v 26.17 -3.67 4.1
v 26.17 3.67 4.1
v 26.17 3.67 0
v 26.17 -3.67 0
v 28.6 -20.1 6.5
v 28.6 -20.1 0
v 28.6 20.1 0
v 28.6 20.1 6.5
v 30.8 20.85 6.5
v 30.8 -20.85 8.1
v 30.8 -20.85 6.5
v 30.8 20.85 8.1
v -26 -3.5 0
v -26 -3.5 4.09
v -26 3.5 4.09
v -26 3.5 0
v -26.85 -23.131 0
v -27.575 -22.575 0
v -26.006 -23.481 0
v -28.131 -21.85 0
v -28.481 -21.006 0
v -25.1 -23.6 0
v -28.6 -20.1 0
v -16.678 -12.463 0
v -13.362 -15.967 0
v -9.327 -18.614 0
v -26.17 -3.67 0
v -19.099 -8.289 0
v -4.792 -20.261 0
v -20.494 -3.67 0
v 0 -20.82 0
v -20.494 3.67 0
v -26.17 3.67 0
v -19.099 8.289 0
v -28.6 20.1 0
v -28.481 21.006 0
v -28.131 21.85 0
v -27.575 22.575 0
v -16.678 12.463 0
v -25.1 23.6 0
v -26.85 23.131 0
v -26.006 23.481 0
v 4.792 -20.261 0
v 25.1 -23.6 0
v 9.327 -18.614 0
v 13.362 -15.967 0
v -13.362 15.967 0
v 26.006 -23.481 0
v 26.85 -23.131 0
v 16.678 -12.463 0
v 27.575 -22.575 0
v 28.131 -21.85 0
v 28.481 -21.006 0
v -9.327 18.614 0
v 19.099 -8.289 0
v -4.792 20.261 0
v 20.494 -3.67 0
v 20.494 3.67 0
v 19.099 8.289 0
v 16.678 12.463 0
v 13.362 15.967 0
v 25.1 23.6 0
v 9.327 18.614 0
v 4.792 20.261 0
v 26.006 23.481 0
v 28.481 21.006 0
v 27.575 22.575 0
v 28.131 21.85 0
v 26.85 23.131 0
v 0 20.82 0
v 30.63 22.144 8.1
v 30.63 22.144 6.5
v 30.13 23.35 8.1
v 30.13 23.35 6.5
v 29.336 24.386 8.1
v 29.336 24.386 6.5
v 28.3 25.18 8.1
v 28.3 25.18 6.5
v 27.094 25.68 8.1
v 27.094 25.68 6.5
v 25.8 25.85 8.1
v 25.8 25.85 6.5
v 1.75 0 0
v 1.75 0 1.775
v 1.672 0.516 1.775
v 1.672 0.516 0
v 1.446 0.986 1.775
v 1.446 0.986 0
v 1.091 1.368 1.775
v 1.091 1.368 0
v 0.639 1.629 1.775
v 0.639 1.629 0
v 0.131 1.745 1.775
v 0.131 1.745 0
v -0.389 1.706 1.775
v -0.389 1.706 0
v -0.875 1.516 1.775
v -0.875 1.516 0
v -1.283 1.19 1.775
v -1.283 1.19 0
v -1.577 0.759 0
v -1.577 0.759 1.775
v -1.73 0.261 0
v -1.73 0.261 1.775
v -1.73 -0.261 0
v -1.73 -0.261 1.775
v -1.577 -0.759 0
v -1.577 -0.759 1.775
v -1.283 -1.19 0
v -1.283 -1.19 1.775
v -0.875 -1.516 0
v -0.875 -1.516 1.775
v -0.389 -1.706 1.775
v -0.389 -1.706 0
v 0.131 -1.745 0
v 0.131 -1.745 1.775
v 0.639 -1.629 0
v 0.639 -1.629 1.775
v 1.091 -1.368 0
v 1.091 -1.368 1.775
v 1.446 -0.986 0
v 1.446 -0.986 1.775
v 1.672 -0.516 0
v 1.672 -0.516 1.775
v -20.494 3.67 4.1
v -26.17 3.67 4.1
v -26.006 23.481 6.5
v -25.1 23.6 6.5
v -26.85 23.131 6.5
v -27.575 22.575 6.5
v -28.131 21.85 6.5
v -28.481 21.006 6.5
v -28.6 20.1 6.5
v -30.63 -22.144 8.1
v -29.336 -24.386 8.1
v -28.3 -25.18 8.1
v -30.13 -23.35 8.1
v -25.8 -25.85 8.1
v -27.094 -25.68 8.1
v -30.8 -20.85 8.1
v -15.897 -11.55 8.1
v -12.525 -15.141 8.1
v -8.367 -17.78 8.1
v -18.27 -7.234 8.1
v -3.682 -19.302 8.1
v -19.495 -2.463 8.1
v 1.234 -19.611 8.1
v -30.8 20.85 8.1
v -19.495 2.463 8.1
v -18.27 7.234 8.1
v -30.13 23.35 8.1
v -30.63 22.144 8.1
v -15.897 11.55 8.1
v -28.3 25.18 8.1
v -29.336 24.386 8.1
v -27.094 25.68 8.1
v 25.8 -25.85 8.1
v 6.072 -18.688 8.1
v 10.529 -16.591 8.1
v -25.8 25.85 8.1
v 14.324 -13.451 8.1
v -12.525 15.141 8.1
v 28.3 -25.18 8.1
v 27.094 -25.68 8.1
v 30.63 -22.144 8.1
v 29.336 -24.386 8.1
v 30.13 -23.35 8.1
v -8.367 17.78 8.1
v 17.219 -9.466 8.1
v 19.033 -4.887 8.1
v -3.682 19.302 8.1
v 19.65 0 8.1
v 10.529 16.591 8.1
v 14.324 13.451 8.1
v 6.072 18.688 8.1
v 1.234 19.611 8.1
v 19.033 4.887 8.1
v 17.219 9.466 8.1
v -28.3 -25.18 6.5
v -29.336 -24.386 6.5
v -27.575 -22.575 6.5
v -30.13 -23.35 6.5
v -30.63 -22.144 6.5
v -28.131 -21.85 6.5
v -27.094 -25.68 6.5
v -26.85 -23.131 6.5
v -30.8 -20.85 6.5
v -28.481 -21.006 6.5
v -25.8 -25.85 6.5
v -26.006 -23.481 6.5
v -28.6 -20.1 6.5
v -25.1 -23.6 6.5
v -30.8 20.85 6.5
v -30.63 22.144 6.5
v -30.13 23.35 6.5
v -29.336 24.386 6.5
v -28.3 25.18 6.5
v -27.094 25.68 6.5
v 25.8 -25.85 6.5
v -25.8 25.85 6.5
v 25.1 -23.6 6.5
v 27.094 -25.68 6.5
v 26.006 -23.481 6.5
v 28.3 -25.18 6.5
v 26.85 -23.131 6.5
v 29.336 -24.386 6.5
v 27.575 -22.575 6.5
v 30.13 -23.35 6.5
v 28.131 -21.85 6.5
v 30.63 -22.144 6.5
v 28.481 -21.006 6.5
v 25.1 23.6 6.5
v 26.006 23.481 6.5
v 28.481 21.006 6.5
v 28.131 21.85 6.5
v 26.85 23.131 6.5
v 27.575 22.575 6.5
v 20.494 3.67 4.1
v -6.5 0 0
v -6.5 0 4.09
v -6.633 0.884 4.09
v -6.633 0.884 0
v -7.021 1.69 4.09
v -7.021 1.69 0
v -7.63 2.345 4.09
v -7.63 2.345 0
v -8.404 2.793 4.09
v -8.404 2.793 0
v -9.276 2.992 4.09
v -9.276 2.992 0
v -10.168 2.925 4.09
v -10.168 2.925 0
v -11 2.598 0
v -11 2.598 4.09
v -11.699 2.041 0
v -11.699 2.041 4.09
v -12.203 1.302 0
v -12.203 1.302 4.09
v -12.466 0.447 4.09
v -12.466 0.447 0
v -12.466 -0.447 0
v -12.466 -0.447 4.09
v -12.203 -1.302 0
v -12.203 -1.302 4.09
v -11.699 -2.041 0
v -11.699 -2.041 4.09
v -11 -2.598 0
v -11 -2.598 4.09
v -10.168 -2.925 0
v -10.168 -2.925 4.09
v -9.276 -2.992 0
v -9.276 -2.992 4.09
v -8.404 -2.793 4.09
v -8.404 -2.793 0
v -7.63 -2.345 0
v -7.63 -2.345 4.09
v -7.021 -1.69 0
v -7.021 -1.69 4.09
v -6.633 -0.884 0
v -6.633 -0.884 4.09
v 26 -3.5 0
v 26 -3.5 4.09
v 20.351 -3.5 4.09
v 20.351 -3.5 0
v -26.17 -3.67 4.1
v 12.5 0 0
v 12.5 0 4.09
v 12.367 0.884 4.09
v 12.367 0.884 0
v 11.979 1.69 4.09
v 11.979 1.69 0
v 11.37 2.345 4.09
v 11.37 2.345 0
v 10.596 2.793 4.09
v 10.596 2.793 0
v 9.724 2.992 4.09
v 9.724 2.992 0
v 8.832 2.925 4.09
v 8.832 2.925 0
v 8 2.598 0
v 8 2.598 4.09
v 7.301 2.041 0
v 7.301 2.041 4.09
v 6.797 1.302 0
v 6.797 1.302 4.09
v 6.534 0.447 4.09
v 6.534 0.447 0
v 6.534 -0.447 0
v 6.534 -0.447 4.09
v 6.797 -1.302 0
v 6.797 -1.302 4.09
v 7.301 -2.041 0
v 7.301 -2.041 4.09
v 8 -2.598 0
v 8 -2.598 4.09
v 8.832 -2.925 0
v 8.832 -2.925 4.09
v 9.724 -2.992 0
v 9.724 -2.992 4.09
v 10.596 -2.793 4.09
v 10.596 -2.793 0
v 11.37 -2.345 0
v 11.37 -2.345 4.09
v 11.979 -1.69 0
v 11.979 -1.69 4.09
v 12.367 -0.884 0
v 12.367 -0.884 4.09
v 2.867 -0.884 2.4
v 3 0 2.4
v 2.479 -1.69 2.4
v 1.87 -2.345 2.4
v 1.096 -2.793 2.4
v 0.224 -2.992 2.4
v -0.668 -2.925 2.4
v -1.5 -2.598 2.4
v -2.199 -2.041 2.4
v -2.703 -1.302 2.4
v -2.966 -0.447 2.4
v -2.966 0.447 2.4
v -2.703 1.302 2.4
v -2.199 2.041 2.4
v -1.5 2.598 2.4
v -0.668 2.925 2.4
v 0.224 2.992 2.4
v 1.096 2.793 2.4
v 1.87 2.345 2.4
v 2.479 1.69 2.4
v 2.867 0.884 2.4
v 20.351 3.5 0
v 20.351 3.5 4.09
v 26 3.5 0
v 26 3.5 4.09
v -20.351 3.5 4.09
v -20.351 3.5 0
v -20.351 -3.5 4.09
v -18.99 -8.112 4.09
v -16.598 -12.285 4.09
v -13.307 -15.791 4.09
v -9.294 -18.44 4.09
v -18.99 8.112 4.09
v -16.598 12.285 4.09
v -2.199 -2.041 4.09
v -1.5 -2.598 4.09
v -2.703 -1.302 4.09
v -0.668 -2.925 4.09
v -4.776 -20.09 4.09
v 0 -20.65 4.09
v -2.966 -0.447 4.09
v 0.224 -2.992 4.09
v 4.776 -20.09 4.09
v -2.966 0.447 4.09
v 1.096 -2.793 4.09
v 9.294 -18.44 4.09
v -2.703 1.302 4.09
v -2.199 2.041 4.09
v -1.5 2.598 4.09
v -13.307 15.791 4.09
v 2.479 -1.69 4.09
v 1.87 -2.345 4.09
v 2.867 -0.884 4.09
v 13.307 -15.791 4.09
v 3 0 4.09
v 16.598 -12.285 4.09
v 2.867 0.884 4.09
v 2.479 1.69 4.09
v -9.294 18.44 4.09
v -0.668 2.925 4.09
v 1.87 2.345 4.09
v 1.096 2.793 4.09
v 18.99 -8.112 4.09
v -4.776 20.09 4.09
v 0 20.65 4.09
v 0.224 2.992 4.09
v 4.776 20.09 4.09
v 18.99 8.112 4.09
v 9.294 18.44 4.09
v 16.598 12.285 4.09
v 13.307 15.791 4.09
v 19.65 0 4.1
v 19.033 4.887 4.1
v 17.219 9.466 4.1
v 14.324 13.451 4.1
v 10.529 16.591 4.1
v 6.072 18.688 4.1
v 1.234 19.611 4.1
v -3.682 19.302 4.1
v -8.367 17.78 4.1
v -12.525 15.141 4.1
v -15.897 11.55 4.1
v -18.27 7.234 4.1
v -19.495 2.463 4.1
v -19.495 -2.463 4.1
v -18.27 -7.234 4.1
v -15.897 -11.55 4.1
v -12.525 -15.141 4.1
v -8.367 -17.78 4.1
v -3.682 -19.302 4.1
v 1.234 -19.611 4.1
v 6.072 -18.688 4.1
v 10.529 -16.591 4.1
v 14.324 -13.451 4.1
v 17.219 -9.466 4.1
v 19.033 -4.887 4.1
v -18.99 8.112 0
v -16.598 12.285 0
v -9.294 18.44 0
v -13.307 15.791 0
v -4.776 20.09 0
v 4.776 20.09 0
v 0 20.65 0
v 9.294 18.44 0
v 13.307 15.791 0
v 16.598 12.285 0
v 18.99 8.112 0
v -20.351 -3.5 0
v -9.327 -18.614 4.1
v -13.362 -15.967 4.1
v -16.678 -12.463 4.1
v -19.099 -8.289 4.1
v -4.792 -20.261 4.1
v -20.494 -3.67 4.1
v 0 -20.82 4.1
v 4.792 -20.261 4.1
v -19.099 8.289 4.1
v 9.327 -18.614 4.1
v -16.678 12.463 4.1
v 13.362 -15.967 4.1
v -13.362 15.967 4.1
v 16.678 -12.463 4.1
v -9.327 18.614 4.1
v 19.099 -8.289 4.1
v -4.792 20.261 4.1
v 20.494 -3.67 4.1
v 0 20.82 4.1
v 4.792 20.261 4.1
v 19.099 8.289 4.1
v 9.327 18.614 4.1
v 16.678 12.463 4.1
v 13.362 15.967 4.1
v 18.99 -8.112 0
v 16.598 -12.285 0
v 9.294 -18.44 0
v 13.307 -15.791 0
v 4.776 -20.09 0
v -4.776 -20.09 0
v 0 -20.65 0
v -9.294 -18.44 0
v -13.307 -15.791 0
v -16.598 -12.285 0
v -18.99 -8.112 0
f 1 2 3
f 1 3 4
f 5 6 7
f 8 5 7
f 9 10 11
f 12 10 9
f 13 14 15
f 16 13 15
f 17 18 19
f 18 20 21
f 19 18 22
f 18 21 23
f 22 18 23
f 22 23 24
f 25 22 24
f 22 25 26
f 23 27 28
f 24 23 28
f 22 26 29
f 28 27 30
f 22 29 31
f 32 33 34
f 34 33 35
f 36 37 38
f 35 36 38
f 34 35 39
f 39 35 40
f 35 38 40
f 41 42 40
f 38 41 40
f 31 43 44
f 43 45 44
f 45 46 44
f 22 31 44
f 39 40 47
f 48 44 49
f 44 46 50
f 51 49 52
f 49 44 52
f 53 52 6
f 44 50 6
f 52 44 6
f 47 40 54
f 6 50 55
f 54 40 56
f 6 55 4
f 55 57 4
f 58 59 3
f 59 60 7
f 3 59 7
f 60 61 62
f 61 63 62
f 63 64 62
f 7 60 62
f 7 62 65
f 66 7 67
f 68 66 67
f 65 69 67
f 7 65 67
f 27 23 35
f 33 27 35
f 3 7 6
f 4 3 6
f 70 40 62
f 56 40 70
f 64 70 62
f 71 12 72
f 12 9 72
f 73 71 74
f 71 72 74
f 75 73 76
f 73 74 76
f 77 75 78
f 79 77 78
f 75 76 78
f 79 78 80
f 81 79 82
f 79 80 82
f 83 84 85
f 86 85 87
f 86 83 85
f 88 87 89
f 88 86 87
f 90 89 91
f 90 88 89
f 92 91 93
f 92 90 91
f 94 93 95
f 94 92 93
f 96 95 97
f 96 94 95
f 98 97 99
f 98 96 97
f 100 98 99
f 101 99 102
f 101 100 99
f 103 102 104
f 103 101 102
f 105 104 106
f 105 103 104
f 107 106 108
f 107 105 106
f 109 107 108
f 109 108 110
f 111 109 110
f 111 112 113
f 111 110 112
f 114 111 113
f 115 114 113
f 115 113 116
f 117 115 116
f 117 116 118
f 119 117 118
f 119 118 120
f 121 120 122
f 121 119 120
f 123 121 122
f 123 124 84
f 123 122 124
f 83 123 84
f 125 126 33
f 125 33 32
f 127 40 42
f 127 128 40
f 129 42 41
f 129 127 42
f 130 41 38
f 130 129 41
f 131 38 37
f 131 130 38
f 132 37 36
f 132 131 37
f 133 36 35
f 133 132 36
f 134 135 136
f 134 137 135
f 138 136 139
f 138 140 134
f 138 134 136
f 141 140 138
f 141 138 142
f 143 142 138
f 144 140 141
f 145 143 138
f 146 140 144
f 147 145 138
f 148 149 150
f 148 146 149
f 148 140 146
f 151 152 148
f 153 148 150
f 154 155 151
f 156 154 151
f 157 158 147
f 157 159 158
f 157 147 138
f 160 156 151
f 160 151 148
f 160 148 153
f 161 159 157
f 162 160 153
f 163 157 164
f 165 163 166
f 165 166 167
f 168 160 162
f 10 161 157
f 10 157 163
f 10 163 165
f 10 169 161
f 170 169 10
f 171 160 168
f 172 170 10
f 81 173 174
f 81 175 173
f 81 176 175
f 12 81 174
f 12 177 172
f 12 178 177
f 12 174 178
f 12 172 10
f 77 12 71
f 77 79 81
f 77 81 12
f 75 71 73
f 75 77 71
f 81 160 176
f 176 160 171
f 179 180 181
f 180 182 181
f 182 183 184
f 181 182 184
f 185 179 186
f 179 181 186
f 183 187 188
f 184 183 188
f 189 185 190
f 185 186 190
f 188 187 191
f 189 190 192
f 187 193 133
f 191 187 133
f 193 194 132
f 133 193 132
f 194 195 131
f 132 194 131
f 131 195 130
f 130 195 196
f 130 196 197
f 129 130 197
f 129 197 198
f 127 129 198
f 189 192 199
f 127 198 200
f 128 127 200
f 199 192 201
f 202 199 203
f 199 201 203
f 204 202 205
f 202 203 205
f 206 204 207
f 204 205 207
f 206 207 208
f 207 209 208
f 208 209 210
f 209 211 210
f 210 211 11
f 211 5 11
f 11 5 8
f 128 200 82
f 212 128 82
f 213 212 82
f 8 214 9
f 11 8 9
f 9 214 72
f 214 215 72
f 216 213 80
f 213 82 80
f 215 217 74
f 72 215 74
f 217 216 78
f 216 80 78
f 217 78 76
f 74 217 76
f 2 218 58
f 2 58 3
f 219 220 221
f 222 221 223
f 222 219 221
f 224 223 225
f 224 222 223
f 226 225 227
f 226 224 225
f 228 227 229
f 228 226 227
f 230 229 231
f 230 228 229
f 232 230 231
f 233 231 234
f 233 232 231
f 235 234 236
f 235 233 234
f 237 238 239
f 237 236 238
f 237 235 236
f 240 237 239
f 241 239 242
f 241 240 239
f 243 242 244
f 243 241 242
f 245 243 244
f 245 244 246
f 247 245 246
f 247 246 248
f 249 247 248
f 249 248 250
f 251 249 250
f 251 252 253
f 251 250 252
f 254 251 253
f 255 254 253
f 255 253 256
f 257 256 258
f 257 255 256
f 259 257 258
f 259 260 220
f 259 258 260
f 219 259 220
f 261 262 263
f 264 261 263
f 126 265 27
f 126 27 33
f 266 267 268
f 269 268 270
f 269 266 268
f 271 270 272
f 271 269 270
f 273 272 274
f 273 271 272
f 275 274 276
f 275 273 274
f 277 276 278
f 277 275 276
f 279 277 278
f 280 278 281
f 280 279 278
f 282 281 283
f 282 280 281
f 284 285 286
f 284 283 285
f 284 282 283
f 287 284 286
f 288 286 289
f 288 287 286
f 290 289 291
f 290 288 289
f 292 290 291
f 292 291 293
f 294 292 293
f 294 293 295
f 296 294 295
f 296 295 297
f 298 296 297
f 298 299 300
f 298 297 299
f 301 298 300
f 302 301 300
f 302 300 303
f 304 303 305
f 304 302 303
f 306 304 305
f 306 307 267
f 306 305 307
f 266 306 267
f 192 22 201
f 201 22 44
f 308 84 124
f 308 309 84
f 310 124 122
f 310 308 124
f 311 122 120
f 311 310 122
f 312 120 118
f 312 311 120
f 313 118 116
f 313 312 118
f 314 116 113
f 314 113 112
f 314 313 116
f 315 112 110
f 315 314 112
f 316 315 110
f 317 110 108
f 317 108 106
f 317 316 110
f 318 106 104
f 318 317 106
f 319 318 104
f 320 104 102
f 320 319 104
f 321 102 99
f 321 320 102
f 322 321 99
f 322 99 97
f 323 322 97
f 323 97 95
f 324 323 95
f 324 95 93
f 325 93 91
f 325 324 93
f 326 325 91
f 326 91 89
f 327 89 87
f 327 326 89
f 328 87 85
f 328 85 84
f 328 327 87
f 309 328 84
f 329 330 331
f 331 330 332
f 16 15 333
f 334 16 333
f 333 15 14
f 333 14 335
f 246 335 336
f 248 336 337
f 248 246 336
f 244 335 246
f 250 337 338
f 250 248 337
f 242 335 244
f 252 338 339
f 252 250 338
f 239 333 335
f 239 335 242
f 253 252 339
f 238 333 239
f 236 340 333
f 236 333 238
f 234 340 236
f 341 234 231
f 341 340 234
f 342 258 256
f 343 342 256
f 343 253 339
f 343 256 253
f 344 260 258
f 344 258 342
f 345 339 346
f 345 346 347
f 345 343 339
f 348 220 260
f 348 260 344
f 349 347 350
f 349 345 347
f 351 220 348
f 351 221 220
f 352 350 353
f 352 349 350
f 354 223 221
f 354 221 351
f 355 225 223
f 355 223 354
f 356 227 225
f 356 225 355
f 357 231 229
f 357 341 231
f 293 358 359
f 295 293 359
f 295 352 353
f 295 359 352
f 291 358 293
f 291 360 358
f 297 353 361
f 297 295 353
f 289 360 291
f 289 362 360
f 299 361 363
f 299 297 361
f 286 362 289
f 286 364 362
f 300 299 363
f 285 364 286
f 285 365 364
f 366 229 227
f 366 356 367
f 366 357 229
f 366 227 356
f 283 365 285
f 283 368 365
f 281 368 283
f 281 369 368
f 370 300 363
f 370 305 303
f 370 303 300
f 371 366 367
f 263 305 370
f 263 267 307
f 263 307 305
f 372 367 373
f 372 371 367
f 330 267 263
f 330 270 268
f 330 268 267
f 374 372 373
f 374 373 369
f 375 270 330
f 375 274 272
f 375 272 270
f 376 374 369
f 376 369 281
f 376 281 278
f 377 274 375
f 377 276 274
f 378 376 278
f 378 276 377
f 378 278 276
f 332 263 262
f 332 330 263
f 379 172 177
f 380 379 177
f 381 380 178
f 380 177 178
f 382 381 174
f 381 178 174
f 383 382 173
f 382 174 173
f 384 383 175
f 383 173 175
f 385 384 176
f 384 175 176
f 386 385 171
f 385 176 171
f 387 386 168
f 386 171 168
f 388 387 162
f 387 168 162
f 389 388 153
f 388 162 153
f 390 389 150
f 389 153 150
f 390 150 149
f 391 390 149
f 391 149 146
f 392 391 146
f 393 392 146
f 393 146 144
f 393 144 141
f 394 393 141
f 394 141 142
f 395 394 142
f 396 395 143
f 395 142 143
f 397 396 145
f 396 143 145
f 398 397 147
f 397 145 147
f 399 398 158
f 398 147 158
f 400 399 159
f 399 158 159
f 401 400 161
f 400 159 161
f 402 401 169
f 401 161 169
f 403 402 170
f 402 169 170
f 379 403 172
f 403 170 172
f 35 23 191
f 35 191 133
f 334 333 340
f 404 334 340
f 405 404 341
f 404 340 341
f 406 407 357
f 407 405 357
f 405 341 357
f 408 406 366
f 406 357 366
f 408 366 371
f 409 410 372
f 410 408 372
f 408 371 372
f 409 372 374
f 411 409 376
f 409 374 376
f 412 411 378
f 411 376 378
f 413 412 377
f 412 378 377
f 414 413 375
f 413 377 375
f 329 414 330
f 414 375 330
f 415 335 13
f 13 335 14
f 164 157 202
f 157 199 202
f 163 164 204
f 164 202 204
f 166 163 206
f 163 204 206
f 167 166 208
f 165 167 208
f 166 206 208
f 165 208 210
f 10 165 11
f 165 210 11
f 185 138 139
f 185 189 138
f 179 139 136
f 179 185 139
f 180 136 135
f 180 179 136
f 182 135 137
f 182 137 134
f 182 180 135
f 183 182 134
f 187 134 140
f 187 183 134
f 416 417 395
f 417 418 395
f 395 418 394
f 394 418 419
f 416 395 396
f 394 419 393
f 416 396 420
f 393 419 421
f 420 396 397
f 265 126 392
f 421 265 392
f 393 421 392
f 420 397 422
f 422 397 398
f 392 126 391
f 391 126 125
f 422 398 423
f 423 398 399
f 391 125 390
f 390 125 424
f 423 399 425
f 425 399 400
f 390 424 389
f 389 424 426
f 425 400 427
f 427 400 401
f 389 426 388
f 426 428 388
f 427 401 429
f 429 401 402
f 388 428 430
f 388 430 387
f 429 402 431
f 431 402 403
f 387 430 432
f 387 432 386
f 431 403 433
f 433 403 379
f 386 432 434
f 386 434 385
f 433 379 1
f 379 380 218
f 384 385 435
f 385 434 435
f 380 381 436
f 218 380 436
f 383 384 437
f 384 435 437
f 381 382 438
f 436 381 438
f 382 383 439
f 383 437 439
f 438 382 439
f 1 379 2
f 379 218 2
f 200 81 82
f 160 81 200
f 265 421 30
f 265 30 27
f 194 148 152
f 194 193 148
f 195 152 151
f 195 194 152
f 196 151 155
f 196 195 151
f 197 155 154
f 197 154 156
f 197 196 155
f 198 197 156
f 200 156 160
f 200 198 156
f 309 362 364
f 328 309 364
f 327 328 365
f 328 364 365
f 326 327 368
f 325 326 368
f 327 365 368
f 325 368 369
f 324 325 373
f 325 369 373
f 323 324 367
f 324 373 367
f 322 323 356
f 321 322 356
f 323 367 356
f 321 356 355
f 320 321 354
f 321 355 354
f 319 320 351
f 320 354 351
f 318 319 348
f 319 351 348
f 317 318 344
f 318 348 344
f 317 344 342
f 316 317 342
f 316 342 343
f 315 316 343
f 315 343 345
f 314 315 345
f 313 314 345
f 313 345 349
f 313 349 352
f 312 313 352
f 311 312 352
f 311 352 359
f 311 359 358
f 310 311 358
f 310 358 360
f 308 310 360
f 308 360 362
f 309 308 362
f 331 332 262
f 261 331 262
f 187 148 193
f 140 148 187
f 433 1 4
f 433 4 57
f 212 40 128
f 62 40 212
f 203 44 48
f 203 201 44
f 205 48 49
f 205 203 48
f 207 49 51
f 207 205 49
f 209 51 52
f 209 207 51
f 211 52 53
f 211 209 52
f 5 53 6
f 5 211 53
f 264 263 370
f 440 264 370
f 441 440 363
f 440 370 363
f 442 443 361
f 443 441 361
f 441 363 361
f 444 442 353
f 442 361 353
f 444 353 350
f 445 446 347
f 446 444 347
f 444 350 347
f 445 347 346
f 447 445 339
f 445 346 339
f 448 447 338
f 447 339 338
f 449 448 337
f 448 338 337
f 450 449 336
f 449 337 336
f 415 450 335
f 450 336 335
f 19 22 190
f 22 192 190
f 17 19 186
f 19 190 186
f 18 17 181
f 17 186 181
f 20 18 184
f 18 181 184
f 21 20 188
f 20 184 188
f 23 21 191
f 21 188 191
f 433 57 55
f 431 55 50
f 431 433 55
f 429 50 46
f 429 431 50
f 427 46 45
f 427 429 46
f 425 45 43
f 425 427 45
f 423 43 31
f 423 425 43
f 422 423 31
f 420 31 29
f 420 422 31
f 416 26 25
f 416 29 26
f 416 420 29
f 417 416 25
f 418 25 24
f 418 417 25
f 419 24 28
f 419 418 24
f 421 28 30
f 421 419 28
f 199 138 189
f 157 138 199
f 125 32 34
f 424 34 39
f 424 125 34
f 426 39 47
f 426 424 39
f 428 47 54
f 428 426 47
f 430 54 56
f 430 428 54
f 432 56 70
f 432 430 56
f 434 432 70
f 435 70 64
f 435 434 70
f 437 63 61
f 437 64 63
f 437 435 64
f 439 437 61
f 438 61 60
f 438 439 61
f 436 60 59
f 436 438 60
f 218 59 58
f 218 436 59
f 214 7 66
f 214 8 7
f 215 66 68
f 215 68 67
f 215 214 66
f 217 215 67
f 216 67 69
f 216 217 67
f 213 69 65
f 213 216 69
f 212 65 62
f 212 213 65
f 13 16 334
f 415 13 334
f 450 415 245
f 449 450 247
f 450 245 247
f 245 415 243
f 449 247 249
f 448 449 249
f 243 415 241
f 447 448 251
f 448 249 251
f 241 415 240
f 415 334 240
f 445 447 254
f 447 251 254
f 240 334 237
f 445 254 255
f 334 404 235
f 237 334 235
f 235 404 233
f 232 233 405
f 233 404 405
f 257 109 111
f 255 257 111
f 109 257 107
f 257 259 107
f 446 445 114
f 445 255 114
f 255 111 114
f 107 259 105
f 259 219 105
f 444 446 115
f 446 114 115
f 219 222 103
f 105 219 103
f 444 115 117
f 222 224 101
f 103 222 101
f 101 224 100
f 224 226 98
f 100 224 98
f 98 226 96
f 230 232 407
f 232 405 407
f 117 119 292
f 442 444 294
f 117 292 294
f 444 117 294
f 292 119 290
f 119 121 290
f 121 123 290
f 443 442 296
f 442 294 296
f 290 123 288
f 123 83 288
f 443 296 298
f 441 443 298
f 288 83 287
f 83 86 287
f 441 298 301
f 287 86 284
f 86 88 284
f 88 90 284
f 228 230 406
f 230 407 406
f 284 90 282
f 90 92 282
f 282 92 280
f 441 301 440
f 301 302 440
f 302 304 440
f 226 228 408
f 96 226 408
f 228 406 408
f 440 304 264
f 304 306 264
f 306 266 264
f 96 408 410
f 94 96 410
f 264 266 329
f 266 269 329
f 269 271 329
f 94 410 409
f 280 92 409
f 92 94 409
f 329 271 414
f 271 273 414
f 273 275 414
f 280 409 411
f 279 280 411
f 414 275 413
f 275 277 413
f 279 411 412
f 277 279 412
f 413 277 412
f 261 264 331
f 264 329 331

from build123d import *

# Parameters (mm, degrees)
SKETCH1_W           = 57.2
SKETCH1_H           = 47.2
SKETCH1_R           = 1.75
SKETCH1_R_2         = 3
BOSS_EXTRUDE1_DEPTH = 8.1
SKETCH2_R           = 19.65
CUT_EXTRUDE1_DEPTH  = 4
SKETCH3_R           = 3
CUT_EXTRUDE2_DEPTH  = 1.7
SKETCH5_W           = 57.2
SKETCH5_H           = 47.2
BOSS_EXTRUDE2_DEPTH = 1.6
FILLET1_R           = 3.5
FILLET2_R           = 5
CUT_EXTRUDE7_DEPTH  = 41.418714725
CUT_EXTRUDE8_DEPTH  = 0.01


with BuildPart() as part:
    # Sketch1 → Boss-Extrude1 (new body)
    with BuildSketch(Plane.XY):
        Rectangle(SKETCH1_W, SKETCH1_H)
        Circle(SKETCH1_R, mode=Mode.SUBTRACT)
        with Locations((-9.5, 0)):
            Circle(SKETCH1_R_2, mode=Mode.SUBTRACT)
        with Locations((9.5, 0)):
            Circle(SKETCH1_R_2, mode=Mode.SUBTRACT)
    extrude(amount=BOSS_EXTRUDE1_DEPTH)

    # Sketch2 → Cut-Extrude1 (cut)
    with BuildSketch(Plane.XY.offset(8.1)):
        Circle(SKETCH2_R)
    extrude(amount=-CUT_EXTRUDE1_DEPTH, mode=Mode.SUBTRACT)

    # Sketch3 → Cut-Extrude2 (cut)
    with BuildSketch(Plane.XY.offset(4.1)):
        Circle(SKETCH3_R)
    extrude(amount=-CUT_EXTRUDE2_DEPTH, mode=Mode.SUBTRACT)

    # Sketch4 → Cut-Revolve1 (revolve, cut)
    with BuildSketch(Plane(origin=(0, 0, 0), x_dir=(1, 0, 0), z_dir=(0, 1, 0))):
        Polygon((0, -2.4), (0, -0.9), (3, -2.4), align=None)
    revolve(axis=Axis((0, 0, 2.4), (0, 0, -1)), mode=Mode.SUBTRACT)

    # Sketch5 → Boss-Extrude2 (add)
    with BuildSketch(Plane.XY.offset(8.1)):
        Polygon((-30.8, 0), (-30.8, -25.85), (30.8, -25.85), (30.8, 25.85), (-30.8, 25.85), align=None)
        Rectangle(SKETCH5_W, SKETCH5_H, mode=Mode.SUBTRACT)
    extrude(amount=-BOSS_EXTRUDE2_DEPTH)

    # Fillet1
    fillet1_edges = [part.edges().sort_by_distance(p)[0] for p in [
        (28.6, -23.6, 3.25),
        (-28.6, -23.6, 3.25),
        (-28.6, 23.6, 3.25),
        (28.6, 23.6, 3.25),
    ]]
    fillet(fillet1_edges, radius=FILLET1_R)

    # Fillet2
    fillet2_edges = [part.edges().sort_by_distance(p)[0] for p in [
        (-30.8, 25.85, 7.3),
        (30.8, 25.85, 7.3),
        (30.8, -25.85, 7.3),
        (-30.8, -25.85, 7.3),
    ]]
    fillet(fillet2_edges, radius=FILLET2_R)

    # Sketch9 → Cut-Extrude7 (cut, through all)
    with BuildSketch(Plane.XY.offset(4.1)):
        with BuildLine():
            Line((-26.17, 3.67), (-20.493986923, 3.67))
            ThreePointArc((-20.493986923, 3.67), (0, 20.82), (20.493986923, 3.67))
            Line((20.493986923, 3.67), (26.17, 3.67))
            Line((26.17, 3.67), (26.17, -3.67))
            Line((26.17, -3.67), (20.493986923, -3.67))
            ThreePointArc((20.493986923, -3.67), (0, -20.82), (-20.493986923, -3.67))
            Line((-20.493986923, -3.67), (-26.17, -3.67))
            Line((-26.17, -3.67), (-26.17, 3.67))
        make_face()
        with BuildLine():
            Line((-26, 3.5), (-20.351228464, 3.5))
            ThreePointArc((-20.351228464, 3.5), (0, 20.65), (20.351228464, 3.5))
            Line((20.351228464, 3.5), (26, 3.5))
            Line((26, 3.5), (26, -3.5))
            Line((26, -3.5), (20.351228464, -3.5))
            ThreePointArc((20.351228464, -3.5), (0, -20.65), (-20.351228464, -3.5))
            Line((-20.351228464, -3.5), (-26, -3.5))
            Line((-26, -3.5), (-26, 3.5))
        make_face(mode=Mode.SUBTRACT)
    extrude(amount=-CUT_EXTRUDE7_DEPTH, mode=Mode.SUBTRACT)

    # Sketch11 → Cut-Extrude8 (cut)
    with BuildSketch(Plane.XY.offset(4.1)):
        with BuildLine():
            Line((20.493986923, -3.67), (26.17, -3.67))
            Line((26.17, -3.67), (26.17, 3.67))
            Line((26.17, 3.67), (20.493986923, 3.67))
            ThreePointArc((20.493986923, 3.67), (0, 20.82), (-20.493986923, 3.67))
            Line((-20.493986923, 3.67), (-26.17, 3.67))
            Line((-26.17, 3.67), (-26.17, -3.67))
            Line((-26.17, -3.67), (-20.493986923, -3.67))
            ThreePointArc((-20.493986923, -3.67), (0, -20.82), (20.493986923, -3.67))
        make_face()
    extrude(amount=-CUT_EXTRUDE8_DEPTH, mode=Mode.SUBTRACT)


with BuildPart() as cut_extrude8_piece_1:
    # of the separate pieces the step leaves, piece 1, a body of its own (cut_extrude8_pieces)
    add(part.part.solids().sort_by_distance((-25.8, -25.85, 6.5))[0])


with BuildPart() as cut_extrude8_piece_2:
    # of the separate pieces the step leaves, piece 2, a body of its own (cut_extrude8_pieces)
    add(part.part.solids().sort_by_distance((-6.5, 0, 0))[0])


solid = Compound([cut_extrude8_piece_1.part, cut_extrude8_piece_2.part])
